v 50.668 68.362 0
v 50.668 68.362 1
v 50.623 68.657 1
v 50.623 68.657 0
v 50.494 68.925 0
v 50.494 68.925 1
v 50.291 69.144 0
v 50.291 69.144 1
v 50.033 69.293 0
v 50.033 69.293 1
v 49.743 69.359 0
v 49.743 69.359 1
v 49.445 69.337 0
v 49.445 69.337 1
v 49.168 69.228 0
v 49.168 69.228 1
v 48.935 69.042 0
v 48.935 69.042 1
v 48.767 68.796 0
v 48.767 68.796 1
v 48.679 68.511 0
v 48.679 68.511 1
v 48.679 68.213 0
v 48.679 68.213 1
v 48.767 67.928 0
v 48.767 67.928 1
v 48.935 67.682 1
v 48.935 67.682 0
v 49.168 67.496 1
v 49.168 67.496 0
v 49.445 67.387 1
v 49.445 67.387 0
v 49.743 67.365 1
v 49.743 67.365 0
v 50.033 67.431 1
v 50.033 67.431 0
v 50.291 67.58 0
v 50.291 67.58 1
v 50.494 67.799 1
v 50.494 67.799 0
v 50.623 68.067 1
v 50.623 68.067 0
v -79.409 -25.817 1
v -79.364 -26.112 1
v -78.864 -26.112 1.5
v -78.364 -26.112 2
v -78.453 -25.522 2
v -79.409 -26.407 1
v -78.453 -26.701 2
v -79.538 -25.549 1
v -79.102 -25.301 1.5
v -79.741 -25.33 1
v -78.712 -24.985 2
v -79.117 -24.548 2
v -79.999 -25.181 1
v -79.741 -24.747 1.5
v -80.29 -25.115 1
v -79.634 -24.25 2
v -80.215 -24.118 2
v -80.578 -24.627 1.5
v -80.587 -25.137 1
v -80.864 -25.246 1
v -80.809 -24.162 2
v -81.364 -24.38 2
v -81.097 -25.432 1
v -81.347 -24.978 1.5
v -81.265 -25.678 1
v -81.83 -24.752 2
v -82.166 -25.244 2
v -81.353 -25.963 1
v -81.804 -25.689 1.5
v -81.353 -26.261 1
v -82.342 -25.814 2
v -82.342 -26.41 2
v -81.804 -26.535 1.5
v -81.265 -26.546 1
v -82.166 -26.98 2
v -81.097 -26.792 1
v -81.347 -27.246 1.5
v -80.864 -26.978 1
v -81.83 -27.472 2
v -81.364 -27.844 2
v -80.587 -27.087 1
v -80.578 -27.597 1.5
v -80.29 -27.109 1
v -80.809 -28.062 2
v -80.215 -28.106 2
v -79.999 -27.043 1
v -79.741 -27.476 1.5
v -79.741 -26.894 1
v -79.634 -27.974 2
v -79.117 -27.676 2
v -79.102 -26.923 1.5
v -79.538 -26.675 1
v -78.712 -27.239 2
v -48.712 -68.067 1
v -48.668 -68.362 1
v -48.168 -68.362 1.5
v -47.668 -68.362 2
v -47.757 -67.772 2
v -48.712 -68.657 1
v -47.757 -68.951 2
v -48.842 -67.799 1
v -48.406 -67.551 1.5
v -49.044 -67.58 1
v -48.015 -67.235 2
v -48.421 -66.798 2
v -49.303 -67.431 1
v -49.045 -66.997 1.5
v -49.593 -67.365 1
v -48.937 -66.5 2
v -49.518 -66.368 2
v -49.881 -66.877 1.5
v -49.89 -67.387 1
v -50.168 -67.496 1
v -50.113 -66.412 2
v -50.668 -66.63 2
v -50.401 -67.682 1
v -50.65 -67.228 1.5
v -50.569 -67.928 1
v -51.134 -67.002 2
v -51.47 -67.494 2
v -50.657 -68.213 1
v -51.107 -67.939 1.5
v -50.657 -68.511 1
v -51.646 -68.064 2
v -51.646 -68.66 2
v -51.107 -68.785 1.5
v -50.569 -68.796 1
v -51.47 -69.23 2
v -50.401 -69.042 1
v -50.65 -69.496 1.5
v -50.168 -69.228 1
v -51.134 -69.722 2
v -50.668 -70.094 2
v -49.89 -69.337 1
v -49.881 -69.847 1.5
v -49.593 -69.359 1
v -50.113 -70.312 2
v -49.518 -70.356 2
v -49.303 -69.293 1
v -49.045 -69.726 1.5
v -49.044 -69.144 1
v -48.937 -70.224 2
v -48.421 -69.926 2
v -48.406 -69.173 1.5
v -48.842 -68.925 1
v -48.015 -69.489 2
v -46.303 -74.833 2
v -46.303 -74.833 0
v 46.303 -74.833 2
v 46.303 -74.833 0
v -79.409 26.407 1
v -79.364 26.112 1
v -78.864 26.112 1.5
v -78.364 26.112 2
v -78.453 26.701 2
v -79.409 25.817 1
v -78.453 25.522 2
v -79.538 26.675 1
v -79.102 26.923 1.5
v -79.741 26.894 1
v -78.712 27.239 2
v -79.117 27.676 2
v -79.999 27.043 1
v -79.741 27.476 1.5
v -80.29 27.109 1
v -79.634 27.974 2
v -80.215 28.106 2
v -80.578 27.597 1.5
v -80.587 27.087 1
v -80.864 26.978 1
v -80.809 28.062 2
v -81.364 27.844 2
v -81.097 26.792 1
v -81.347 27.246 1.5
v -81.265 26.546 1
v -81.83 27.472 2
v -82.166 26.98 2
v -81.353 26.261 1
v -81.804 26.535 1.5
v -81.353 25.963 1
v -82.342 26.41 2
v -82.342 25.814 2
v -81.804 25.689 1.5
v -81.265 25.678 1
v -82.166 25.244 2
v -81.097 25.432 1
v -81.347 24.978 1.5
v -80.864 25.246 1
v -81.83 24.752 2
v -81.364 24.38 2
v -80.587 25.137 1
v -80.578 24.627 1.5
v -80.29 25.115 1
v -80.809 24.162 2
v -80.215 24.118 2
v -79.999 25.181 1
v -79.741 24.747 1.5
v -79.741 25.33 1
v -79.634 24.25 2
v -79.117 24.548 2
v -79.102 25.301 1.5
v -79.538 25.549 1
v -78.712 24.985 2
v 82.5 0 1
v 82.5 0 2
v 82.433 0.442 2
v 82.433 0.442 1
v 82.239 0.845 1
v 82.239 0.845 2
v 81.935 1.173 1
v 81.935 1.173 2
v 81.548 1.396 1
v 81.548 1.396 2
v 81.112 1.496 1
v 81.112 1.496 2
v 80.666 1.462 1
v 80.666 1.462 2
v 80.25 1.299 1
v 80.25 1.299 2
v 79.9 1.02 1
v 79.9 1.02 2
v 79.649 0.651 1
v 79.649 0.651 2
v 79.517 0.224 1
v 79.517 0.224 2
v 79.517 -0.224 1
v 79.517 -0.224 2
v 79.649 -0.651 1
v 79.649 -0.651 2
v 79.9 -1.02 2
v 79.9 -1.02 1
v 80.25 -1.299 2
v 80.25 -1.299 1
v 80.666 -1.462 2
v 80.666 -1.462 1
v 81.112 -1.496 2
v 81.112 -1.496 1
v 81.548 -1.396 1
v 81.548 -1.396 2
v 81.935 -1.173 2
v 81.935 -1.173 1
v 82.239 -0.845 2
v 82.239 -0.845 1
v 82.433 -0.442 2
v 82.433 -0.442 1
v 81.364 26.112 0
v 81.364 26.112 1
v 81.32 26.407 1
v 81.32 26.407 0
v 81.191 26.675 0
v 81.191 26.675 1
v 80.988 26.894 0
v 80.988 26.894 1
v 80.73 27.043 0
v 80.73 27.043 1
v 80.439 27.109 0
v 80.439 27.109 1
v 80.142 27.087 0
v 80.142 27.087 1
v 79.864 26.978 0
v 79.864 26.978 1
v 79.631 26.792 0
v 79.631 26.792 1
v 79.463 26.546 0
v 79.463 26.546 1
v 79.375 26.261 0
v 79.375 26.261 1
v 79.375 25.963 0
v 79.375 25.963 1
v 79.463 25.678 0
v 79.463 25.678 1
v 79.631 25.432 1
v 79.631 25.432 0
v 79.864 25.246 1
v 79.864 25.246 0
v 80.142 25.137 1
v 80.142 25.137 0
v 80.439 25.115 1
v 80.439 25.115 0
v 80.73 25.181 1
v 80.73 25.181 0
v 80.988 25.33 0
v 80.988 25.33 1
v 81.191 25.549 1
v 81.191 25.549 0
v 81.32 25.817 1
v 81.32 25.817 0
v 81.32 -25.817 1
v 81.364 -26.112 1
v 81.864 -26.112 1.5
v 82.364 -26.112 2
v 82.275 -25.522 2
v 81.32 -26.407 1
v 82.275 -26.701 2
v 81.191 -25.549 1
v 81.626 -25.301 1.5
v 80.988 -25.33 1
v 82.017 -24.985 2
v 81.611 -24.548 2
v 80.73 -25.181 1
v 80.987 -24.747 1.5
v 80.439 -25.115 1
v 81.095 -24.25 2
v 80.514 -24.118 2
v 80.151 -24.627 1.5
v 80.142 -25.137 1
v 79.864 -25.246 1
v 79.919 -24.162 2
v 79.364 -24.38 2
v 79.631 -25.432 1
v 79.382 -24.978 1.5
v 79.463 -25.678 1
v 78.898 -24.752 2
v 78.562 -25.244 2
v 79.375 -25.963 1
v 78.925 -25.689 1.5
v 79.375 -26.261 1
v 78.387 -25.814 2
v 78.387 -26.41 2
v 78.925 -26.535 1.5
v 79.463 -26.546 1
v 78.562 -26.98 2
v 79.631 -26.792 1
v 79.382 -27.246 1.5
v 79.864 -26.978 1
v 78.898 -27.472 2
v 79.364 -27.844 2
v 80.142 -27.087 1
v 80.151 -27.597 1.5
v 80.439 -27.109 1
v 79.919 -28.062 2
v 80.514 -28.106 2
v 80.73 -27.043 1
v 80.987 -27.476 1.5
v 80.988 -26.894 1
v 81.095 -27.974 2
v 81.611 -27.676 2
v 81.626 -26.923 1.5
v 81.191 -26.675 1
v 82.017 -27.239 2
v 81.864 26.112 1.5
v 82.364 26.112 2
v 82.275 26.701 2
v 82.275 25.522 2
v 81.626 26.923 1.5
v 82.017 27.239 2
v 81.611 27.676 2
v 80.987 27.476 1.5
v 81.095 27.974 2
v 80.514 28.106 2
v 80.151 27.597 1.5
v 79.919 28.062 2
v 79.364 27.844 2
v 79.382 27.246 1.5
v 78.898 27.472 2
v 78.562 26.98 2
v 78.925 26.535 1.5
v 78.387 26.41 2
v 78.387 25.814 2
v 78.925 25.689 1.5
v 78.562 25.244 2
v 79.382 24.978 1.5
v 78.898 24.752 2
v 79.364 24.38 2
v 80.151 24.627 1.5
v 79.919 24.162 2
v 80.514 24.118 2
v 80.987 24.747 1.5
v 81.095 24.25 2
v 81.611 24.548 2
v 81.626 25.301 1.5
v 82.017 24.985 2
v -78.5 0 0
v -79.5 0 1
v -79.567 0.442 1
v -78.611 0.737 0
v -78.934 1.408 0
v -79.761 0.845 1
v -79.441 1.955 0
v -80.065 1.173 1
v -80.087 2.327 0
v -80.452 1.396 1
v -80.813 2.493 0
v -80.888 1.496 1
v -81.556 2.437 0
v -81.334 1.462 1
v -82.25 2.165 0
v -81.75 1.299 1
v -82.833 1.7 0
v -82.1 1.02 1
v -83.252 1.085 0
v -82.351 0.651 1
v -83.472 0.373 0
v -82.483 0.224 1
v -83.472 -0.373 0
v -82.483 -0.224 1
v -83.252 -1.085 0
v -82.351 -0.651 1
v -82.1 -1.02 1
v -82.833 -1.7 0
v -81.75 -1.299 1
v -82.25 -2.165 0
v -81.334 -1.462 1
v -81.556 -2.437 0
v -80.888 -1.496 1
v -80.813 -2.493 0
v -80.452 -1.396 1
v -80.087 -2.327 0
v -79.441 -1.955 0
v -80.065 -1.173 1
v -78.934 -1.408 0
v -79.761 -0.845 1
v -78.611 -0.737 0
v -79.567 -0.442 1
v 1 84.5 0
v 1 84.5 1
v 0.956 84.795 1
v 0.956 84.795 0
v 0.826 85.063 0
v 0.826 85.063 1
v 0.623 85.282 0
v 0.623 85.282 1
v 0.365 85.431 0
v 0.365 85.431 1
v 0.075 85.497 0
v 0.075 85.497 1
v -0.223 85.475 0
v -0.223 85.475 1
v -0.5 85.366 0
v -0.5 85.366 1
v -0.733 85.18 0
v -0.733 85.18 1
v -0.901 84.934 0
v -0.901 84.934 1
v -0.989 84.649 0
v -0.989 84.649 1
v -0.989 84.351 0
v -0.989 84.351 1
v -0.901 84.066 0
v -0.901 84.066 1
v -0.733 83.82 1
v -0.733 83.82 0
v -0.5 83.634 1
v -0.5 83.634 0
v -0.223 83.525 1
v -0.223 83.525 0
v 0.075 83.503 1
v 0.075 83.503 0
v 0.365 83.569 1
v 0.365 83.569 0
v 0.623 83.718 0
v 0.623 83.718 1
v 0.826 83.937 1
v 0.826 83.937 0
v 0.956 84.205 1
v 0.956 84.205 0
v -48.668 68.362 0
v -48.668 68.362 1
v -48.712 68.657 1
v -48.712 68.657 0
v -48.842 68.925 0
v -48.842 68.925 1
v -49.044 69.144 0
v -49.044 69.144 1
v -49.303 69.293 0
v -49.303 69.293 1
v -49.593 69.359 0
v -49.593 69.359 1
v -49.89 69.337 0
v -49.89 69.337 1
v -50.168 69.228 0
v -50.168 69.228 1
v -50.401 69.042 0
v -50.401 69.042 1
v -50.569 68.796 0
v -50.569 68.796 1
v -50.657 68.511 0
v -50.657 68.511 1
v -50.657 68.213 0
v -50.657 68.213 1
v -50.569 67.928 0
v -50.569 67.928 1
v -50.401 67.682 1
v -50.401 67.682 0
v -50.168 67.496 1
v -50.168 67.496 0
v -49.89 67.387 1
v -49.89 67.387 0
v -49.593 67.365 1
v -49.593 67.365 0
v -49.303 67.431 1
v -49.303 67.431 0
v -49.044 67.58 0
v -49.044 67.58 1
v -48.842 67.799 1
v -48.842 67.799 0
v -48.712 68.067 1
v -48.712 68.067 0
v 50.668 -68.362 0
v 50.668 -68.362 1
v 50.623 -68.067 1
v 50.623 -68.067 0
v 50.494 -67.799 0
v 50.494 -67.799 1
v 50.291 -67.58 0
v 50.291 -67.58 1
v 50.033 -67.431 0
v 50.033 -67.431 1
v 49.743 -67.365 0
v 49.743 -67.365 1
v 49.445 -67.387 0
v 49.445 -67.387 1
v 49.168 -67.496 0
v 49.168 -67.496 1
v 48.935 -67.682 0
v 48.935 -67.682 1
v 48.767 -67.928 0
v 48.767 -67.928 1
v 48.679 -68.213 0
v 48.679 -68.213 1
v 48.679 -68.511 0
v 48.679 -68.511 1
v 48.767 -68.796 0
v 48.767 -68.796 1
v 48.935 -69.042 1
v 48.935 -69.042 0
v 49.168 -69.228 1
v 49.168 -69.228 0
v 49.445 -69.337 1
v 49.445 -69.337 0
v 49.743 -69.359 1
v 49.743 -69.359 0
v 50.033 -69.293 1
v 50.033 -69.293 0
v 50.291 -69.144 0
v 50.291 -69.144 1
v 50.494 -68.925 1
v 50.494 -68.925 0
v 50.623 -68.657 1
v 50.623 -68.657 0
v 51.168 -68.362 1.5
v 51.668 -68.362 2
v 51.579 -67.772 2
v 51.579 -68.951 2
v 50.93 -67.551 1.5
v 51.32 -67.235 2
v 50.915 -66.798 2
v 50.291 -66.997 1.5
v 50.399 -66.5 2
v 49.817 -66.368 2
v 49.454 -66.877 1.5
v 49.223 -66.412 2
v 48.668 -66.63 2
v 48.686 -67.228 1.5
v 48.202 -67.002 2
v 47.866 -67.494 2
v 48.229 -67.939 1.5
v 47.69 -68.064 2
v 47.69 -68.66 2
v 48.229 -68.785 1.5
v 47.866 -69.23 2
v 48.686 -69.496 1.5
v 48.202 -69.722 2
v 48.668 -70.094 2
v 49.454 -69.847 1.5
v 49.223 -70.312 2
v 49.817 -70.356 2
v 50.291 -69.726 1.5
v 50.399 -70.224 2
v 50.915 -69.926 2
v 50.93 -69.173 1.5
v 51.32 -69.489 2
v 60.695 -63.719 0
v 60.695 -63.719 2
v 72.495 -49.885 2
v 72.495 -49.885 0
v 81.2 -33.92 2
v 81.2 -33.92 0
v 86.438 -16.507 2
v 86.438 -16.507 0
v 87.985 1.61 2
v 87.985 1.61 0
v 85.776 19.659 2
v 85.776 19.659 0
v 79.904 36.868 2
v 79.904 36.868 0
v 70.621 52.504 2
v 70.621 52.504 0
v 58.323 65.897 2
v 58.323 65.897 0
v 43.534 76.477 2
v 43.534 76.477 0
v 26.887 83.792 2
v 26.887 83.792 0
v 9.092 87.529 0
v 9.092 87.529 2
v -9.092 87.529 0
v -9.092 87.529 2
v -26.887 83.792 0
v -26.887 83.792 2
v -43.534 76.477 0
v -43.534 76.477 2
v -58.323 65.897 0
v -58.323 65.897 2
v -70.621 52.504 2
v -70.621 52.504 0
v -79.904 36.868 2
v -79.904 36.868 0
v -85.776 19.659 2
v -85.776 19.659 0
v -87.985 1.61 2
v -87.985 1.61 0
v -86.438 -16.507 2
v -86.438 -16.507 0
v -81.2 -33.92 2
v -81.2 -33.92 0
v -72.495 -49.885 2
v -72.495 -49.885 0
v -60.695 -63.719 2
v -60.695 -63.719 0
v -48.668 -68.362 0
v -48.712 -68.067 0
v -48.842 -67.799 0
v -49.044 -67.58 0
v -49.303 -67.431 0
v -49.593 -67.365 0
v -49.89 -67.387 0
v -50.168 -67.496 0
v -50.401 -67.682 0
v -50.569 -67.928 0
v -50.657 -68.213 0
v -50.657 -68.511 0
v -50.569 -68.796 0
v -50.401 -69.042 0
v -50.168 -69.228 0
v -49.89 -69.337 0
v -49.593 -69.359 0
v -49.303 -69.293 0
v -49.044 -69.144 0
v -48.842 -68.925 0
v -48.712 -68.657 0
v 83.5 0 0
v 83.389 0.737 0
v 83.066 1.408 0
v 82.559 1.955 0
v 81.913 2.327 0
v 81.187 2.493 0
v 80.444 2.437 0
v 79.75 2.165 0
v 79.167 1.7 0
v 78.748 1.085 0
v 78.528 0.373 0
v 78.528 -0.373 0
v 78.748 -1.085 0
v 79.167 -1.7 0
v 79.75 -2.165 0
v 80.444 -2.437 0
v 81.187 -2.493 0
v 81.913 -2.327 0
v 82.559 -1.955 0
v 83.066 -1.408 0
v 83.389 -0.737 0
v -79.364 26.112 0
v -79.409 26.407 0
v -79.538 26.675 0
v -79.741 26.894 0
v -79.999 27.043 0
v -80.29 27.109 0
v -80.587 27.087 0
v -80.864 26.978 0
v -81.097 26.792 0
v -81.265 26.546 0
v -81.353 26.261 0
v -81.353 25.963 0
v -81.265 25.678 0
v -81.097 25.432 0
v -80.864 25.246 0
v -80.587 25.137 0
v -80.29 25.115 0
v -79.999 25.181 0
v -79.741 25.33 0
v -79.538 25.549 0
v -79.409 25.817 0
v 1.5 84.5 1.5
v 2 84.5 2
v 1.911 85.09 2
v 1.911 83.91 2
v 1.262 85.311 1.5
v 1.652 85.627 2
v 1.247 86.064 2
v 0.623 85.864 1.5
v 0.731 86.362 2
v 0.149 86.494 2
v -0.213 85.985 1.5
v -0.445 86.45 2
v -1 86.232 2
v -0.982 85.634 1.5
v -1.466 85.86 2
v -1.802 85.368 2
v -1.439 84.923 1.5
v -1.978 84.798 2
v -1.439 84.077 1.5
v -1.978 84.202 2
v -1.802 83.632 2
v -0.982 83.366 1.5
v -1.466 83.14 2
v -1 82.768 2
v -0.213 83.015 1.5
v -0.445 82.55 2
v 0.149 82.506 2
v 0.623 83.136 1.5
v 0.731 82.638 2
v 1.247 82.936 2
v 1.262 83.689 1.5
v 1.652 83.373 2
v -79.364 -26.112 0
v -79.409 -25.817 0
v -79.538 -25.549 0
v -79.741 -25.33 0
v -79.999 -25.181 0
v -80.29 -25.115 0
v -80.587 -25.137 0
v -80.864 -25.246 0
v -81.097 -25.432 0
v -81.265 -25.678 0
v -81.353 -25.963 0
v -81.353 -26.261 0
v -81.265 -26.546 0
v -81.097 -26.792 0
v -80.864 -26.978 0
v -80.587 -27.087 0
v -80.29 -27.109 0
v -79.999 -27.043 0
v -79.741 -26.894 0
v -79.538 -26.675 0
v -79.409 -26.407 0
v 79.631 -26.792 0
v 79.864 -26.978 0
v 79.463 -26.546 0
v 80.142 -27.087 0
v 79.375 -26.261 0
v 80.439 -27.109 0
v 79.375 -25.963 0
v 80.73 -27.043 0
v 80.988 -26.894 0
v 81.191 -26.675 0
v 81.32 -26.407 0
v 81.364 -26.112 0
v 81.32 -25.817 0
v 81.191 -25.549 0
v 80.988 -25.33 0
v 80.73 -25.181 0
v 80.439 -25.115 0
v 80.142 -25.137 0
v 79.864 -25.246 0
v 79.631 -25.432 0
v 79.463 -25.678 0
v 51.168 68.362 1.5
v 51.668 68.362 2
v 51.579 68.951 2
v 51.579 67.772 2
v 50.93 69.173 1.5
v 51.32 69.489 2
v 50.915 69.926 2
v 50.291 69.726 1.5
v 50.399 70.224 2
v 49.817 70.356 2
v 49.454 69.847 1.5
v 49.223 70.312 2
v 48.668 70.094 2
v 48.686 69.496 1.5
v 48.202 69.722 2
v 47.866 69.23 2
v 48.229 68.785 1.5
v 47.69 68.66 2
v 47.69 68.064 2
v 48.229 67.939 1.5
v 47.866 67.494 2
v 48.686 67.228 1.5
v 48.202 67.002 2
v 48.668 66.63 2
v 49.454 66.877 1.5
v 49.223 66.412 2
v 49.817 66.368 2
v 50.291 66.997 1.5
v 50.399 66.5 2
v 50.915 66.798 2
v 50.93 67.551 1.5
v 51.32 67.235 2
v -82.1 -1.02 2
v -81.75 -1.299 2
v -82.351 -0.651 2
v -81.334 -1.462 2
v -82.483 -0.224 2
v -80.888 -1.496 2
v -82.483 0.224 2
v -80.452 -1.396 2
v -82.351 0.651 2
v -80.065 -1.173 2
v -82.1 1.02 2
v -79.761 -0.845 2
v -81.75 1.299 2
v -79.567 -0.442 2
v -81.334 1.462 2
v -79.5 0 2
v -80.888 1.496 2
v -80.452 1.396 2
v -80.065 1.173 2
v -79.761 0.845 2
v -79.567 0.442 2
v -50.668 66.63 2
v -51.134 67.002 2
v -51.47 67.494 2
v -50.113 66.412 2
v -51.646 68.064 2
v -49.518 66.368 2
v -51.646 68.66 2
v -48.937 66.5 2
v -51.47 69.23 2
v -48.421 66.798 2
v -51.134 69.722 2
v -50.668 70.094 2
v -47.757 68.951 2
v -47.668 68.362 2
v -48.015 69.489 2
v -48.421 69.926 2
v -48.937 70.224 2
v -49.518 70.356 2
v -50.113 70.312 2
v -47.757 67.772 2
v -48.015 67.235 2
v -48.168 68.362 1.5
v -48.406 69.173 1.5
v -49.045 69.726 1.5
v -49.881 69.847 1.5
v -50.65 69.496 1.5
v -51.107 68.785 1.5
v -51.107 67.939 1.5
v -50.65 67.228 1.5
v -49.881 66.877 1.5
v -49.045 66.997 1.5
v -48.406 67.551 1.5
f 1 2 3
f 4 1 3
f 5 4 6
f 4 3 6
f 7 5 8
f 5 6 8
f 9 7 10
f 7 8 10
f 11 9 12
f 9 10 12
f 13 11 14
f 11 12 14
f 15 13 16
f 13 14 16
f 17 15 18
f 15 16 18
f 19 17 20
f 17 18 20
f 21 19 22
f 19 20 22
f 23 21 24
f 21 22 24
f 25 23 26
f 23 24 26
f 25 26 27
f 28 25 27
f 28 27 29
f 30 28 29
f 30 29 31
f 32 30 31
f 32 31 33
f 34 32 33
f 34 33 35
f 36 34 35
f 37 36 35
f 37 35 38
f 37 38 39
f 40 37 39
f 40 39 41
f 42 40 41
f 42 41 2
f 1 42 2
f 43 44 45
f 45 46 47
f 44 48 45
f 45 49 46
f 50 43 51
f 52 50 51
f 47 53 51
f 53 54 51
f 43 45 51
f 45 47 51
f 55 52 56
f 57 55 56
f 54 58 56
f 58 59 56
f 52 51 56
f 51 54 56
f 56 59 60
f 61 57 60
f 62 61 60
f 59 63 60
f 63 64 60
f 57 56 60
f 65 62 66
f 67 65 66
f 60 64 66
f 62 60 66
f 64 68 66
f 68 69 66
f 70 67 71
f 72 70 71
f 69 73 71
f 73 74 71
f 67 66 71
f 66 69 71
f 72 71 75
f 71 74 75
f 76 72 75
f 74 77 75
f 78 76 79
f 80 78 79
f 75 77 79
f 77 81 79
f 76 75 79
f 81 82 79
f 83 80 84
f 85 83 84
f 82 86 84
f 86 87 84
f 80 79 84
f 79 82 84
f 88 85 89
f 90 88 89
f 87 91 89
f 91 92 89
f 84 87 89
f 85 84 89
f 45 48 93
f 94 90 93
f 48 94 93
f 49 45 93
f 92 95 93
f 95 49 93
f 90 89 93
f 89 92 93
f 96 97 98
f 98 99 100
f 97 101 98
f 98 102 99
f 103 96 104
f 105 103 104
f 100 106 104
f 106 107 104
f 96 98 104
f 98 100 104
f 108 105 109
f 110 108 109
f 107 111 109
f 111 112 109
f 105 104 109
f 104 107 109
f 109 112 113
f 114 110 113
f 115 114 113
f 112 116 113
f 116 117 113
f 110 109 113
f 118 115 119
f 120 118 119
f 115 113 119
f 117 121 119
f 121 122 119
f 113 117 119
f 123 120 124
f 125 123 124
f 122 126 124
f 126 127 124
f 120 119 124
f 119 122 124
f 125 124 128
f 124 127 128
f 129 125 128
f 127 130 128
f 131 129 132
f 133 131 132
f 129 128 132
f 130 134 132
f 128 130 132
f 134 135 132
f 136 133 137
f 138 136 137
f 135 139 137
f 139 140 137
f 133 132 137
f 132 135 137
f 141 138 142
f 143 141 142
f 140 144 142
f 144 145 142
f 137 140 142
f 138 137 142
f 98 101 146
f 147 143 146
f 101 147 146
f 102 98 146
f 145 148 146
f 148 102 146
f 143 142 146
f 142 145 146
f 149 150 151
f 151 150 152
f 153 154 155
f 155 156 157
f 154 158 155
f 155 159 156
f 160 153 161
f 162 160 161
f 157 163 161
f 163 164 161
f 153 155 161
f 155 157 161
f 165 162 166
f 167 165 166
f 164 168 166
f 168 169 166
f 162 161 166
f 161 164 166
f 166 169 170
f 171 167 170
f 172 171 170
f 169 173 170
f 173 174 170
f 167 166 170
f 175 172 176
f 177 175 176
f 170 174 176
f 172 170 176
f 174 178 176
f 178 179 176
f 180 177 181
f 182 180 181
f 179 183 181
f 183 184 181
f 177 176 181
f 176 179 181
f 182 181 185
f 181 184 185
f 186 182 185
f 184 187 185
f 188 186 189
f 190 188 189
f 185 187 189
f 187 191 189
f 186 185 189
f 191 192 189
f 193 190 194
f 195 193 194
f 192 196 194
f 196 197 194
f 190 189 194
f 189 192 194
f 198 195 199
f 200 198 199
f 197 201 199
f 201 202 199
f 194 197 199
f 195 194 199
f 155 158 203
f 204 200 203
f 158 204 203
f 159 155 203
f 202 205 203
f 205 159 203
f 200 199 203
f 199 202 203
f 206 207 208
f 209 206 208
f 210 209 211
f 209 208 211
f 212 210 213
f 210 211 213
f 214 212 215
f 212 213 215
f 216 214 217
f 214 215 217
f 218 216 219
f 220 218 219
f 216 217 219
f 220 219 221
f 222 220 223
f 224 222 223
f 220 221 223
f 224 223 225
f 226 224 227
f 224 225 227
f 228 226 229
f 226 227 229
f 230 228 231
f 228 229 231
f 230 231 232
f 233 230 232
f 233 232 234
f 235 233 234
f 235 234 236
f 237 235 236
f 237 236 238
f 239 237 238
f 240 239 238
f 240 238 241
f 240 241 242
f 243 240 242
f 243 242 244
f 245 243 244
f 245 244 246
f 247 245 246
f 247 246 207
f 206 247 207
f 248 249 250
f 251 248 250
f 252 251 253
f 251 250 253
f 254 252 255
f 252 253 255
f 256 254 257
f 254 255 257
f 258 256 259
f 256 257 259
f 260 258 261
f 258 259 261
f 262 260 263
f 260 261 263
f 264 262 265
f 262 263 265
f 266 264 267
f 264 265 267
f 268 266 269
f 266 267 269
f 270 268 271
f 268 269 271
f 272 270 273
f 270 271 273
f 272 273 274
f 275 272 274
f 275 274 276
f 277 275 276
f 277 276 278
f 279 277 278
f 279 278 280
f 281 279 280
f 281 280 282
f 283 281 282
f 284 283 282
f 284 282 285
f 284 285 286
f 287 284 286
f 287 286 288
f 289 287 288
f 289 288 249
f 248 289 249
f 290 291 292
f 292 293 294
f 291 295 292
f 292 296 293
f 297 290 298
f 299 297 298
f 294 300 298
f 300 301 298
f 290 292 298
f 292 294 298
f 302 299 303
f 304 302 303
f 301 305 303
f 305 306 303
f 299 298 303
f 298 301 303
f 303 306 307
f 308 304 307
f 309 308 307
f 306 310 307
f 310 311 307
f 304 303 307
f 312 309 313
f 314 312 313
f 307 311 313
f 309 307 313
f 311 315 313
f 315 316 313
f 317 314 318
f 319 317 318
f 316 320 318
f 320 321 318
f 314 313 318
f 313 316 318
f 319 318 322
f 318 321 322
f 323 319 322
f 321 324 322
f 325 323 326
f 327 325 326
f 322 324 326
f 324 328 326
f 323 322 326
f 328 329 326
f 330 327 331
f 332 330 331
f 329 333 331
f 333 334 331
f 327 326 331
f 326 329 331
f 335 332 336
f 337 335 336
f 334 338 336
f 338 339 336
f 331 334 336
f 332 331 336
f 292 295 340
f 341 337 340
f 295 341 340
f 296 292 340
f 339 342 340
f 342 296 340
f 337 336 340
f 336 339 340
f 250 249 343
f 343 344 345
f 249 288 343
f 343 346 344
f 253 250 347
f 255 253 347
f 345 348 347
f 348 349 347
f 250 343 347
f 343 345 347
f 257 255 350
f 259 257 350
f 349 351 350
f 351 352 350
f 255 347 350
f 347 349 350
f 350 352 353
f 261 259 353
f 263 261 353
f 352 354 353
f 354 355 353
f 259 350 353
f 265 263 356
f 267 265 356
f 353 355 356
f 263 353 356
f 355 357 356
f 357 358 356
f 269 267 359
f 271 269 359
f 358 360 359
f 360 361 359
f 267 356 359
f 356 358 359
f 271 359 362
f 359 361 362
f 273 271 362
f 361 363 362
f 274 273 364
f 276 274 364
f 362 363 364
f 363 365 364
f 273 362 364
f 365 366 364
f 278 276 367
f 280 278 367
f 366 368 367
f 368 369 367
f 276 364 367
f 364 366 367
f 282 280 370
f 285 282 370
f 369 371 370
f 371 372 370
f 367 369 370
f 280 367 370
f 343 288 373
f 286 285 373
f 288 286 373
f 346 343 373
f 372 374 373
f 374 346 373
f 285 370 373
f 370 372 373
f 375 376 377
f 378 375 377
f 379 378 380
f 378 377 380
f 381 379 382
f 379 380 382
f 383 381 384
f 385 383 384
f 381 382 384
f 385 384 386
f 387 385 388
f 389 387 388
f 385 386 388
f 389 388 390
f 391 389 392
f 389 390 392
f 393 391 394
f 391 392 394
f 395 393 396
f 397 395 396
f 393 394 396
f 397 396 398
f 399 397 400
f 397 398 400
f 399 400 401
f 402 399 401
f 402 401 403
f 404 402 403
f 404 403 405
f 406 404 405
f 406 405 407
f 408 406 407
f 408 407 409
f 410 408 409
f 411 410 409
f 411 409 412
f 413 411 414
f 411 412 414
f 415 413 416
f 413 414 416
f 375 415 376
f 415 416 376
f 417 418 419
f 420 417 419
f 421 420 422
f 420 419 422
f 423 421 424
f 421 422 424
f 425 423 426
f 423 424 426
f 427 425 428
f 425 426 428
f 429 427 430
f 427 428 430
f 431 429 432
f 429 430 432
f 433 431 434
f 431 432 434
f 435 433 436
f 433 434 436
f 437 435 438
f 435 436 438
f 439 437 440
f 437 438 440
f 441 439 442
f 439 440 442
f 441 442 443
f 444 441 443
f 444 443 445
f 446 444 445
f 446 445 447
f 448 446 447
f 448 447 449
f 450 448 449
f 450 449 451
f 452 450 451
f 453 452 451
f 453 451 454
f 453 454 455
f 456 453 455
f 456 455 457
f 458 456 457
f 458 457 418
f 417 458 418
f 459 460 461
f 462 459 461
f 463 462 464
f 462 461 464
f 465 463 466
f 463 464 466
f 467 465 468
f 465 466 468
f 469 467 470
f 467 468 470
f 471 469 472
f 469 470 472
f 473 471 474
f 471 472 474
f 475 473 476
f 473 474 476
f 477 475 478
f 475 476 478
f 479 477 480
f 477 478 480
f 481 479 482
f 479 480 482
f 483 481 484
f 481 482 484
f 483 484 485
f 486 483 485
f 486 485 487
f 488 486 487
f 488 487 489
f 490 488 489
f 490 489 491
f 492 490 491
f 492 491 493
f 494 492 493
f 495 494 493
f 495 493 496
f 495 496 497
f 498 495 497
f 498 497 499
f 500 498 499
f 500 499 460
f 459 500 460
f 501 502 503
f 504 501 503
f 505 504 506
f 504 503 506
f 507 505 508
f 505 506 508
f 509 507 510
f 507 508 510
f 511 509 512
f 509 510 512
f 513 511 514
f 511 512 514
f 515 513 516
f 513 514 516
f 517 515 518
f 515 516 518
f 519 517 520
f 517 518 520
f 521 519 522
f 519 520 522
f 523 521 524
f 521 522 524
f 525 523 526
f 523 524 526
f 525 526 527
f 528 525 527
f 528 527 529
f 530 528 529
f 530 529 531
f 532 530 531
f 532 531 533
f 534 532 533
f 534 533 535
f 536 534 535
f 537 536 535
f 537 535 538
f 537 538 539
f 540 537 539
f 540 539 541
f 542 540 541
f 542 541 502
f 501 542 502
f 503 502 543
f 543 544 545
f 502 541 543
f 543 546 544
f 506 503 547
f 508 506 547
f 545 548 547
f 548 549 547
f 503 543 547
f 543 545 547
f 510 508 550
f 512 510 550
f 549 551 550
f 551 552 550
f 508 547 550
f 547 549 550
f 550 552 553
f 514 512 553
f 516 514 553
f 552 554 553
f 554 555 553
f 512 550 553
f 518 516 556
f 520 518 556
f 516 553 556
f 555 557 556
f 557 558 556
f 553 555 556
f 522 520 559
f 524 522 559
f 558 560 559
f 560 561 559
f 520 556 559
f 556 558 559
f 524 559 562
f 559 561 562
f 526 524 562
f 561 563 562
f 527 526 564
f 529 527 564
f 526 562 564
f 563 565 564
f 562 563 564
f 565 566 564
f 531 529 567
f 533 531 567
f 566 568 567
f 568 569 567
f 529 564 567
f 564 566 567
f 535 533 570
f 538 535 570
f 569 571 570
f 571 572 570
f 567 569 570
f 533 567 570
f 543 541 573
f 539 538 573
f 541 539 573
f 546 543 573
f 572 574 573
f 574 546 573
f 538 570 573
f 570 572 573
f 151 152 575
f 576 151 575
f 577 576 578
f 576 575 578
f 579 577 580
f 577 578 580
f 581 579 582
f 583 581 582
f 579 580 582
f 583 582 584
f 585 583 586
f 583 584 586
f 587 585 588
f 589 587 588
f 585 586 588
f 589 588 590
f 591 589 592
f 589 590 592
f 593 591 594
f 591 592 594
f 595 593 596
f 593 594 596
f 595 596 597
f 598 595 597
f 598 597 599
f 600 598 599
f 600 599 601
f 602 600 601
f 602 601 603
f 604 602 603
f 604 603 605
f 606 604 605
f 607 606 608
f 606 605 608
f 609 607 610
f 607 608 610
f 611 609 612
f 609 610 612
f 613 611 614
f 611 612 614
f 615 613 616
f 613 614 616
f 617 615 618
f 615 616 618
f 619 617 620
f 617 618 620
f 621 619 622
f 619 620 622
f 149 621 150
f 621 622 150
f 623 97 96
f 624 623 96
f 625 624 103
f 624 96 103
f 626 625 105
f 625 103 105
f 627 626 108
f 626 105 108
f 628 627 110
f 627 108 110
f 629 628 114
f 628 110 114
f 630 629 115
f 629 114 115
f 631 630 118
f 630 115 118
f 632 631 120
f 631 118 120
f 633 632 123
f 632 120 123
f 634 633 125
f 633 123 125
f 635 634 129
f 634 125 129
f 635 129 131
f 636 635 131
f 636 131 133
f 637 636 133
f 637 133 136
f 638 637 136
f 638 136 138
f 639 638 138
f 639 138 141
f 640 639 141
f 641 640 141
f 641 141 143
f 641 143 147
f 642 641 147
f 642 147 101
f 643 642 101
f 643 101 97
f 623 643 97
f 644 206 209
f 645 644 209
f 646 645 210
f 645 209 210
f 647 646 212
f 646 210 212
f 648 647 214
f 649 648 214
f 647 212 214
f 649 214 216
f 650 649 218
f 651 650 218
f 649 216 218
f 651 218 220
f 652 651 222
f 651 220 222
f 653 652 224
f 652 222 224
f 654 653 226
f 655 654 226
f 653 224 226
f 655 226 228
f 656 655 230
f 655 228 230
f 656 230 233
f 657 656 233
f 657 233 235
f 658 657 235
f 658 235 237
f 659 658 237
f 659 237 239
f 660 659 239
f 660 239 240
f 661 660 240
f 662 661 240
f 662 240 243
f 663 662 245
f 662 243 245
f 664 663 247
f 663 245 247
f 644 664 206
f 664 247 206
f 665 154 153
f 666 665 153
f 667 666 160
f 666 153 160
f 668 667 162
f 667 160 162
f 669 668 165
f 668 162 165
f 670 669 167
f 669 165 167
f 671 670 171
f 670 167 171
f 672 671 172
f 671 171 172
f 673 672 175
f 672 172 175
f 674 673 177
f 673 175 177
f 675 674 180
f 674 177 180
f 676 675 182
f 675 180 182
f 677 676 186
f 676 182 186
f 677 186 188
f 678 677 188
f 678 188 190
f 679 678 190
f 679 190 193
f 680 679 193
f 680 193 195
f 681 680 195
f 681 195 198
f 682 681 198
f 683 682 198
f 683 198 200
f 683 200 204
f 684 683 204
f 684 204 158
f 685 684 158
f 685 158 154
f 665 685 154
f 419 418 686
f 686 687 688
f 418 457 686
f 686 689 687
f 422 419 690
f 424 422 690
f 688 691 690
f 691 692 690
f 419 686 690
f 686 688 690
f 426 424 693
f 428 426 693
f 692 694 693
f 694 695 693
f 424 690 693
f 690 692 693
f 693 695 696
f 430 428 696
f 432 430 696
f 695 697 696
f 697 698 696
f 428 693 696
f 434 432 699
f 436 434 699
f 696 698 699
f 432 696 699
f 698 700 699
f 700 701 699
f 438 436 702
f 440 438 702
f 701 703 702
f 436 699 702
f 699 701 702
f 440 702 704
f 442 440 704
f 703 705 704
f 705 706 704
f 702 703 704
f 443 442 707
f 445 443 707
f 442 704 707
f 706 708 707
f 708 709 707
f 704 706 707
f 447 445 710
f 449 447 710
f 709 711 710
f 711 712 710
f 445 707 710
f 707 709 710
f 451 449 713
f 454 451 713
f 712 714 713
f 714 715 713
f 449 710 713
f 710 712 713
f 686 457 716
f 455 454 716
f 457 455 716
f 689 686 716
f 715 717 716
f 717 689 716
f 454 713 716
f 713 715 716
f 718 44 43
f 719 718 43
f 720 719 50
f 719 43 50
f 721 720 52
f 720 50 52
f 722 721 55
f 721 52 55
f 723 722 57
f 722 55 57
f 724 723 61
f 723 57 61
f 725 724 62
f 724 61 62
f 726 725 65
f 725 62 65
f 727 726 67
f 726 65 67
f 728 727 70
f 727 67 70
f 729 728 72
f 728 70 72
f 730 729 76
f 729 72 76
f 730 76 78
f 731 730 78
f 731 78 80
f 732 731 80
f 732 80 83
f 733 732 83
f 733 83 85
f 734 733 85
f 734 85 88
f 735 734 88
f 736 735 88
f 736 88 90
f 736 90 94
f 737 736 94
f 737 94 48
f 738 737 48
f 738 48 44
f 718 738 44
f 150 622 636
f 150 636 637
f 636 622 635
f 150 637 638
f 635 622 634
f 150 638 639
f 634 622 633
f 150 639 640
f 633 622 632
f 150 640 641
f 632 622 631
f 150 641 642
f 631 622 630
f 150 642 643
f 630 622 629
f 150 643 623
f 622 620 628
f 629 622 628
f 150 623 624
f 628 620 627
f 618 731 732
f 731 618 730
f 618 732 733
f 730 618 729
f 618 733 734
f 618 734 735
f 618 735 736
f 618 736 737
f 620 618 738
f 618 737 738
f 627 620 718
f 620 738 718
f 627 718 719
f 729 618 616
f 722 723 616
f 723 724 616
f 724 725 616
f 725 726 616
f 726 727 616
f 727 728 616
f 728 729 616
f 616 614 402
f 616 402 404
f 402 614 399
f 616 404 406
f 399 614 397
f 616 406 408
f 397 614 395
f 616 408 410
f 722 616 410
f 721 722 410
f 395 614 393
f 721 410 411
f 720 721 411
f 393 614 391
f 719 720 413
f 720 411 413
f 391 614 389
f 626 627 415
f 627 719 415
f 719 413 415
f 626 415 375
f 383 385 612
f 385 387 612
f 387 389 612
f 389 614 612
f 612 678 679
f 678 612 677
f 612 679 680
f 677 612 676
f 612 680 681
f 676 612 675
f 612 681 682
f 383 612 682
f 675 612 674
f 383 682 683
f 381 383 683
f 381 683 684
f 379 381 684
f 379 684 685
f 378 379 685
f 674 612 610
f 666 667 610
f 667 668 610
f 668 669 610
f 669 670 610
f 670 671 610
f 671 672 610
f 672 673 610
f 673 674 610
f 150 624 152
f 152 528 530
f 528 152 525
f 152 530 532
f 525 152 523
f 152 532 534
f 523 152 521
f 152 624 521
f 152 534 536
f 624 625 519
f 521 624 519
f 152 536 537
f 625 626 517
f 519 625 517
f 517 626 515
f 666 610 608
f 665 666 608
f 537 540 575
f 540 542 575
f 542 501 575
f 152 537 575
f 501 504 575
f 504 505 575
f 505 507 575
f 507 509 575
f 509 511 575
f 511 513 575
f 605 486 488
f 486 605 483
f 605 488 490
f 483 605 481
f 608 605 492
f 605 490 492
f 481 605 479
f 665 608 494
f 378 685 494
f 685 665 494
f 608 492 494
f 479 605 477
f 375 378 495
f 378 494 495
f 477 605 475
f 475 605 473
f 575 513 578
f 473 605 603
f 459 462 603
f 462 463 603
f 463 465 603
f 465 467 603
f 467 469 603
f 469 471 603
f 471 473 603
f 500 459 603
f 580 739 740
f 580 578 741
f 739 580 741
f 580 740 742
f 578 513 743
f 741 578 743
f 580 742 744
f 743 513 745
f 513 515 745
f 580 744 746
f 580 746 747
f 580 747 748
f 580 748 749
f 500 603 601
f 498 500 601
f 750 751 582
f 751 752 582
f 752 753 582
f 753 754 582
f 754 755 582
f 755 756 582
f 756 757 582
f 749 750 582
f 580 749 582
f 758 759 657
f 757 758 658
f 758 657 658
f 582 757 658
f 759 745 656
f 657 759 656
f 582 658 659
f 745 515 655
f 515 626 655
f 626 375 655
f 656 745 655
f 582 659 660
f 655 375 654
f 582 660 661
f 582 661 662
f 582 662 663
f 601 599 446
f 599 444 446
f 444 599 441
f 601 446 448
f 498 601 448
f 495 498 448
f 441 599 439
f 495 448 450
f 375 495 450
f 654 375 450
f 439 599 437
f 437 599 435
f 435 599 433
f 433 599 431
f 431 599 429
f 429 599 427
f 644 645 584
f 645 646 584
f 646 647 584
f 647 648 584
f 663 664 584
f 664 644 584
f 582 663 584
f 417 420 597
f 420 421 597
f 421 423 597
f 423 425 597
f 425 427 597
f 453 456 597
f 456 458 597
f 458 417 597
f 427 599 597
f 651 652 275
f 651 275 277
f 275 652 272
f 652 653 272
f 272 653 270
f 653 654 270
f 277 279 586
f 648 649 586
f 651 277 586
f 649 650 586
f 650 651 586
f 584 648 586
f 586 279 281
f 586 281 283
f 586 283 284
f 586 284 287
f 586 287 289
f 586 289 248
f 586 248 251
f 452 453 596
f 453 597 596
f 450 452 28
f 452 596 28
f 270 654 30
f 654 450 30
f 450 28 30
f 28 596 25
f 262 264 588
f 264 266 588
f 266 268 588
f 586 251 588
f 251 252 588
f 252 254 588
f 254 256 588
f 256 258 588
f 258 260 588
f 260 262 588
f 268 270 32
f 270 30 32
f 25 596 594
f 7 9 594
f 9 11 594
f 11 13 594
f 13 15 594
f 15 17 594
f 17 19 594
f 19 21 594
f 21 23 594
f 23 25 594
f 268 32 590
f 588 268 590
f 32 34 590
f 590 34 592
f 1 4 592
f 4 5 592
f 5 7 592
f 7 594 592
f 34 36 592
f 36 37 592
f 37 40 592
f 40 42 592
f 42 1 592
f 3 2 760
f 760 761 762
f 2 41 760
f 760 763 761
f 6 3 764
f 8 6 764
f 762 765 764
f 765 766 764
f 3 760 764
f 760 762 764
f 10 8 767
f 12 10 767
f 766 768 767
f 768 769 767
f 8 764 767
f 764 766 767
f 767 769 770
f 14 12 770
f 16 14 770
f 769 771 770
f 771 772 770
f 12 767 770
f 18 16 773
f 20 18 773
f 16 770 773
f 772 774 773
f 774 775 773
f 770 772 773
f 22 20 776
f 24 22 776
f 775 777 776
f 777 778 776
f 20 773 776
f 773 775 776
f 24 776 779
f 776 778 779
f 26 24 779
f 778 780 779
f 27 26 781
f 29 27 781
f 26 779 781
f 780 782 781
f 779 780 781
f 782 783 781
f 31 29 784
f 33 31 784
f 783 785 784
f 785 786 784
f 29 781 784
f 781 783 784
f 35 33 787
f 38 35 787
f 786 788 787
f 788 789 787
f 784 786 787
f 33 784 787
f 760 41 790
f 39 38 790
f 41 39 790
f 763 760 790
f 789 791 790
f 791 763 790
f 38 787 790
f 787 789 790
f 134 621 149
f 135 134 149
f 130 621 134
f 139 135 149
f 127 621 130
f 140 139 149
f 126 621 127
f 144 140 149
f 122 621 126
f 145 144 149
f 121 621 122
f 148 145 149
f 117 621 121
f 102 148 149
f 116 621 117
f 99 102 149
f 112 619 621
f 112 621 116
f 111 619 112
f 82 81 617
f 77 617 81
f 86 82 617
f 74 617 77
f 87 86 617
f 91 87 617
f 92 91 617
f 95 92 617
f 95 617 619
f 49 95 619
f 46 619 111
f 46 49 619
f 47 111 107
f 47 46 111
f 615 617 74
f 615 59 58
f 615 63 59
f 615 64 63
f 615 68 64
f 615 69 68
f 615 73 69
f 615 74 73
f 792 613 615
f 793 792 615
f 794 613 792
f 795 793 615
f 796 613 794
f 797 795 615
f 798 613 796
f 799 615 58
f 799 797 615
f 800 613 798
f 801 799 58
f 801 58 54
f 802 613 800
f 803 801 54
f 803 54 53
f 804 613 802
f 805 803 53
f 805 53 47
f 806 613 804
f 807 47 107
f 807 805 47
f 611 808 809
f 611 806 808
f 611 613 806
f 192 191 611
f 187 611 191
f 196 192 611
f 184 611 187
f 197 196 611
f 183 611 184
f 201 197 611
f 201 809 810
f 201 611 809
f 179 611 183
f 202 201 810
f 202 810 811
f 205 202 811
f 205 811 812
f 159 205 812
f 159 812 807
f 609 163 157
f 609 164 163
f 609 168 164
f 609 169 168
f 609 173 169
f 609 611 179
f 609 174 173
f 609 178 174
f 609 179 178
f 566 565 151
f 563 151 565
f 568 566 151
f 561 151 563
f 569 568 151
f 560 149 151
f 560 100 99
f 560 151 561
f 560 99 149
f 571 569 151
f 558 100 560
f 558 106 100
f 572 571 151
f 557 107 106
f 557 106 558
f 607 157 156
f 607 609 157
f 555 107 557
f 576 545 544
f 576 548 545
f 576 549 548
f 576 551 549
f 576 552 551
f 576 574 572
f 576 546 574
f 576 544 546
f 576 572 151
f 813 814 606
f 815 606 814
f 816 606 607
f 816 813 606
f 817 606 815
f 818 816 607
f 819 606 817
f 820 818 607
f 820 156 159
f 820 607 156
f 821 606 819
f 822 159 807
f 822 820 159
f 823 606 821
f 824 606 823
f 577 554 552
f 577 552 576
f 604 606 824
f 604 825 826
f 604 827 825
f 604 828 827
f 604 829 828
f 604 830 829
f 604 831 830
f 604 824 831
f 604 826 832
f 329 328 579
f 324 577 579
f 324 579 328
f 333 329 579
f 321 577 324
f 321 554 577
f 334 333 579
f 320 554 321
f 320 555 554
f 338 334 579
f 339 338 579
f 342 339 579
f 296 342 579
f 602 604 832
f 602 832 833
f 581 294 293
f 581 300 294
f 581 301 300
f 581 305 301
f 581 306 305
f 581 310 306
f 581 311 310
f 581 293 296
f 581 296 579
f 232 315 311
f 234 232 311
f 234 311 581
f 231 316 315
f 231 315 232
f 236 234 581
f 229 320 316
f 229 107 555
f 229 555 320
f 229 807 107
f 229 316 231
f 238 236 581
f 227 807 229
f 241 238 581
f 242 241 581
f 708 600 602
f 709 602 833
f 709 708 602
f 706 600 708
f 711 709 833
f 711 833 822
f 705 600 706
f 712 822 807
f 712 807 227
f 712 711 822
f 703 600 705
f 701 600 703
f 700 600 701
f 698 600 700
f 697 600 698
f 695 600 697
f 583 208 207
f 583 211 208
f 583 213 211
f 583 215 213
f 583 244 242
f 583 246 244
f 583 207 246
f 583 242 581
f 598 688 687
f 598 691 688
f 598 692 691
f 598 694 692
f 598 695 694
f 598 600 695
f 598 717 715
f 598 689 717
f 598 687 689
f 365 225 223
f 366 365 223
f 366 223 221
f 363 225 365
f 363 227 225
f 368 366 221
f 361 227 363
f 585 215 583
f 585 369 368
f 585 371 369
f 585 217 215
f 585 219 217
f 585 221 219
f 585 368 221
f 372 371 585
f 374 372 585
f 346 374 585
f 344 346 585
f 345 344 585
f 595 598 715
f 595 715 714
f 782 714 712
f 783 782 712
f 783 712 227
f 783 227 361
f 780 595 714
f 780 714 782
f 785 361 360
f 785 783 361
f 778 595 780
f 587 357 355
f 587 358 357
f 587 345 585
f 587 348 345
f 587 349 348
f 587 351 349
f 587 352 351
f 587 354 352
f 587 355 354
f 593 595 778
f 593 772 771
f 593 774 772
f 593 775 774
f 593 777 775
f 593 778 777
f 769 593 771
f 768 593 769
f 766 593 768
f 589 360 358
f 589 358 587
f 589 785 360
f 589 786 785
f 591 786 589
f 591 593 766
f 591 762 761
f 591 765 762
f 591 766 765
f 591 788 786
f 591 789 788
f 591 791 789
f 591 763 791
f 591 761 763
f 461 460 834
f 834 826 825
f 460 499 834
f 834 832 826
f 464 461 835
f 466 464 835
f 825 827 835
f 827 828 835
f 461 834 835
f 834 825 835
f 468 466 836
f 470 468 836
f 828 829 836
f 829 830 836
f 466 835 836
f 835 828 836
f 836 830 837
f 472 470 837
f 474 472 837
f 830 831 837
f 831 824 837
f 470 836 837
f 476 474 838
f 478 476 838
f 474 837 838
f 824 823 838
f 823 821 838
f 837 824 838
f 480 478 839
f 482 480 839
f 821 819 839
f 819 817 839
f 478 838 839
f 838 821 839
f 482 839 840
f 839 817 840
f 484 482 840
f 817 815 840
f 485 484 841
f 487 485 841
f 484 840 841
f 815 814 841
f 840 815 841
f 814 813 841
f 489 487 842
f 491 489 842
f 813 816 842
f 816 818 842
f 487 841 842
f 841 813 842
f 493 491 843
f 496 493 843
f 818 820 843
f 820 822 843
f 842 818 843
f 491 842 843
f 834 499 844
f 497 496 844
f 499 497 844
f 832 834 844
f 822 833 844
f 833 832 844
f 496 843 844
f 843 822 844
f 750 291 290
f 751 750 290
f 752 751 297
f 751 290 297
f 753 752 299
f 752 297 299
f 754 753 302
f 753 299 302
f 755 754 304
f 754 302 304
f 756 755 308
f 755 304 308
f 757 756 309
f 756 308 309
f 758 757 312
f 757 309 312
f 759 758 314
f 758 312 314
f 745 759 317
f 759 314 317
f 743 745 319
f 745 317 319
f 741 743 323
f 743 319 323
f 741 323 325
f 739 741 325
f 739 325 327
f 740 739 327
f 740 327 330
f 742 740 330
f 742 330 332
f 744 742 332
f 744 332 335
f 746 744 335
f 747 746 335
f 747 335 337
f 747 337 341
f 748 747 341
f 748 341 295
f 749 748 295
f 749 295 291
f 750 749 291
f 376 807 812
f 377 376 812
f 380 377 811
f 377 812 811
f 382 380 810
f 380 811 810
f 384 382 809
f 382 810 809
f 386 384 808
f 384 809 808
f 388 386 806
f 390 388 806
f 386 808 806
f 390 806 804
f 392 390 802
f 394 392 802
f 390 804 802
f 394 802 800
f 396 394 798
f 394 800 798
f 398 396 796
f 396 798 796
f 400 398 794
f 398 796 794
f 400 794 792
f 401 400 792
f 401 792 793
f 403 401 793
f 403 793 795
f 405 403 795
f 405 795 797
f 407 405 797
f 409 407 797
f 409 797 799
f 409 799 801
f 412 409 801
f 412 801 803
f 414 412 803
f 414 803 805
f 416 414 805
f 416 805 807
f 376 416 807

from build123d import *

# Parameters (mm, degrees)
RESSALTO_EXTRUS_O1_DEPTH = 2
CORTE_EXTRUS_O2_REACH    = 4
ESBO_O3_R                = 1.5
CHANFRO2_SIZE            = 1
CORTE_EXTRUS_O3_REACH    = 4
ESBO_O4_R                = 1
CHANFRO3_SIZE            = 1


with BuildPart() as part:
    # Esboço1 → Ressalto-extrusão1 (new body)
    with BuildSketch(Plane.XY):
        with BuildLine():
            Line((-46.303347611, -74.833147735), (46.303347611, -74.833147735))
            ThreePointArc((46.303347611, -74.833147735), (0, 88), (-46.303347611, -74.833147735))
        make_face()
    extrude(amount=RESSALTO_EXTRUS_O1_DEPTH)

    # Esboço3 → Corte-extrusão2 (cut, up to next)
    with BuildSketch(Plane.XY.offset(2), mode=Mode.PRIVATE) as corte_extrus_o2_sk1:
        with Locations((81, 0)):
            Circle(ESBO_O3_R)
    corte_extrus_o2_tool1 = extrude(corte_extrus_o2_sk1.sketch, amount=-CORTE_EXTRUS_O2_REACH, mode=Mode.PRIVATE) & part.part
    add(corte_extrus_o2_tool1.solids().sort_by_distance((81, 0, 2))[0], mode=Mode.SUBTRACT)
    # Esboço3 → Corte-extrusão2 (cut, up to next)
    with BuildSketch(Plane.XY.offset(2), mode=Mode.PRIVATE) as corte_extrus_o2_sk2:
        with Locations((-81, 0)):
            Circle(ESBO_O3_R)
    corte_extrus_o2_tool2 = extrude(corte_extrus_o2_sk2.sketch, amount=-CORTE_EXTRUS_O2_REACH, mode=Mode.PRIVATE) & part.part
    add(corte_extrus_o2_tool2.solids().sort_by_distance((-81, 0, 2))[0], mode=Mode.SUBTRACT)

    # Chanfro2
    chanfro2_edges = [part.edges().sort_by_distance(p)[0] for p in [
        (79.5, 0, 0),
        (-82.5, 0, 0),
    ]]
    chamfer(chanfro2_edges, length=CHANFRO2_SIZE)

    # Esboço4 → Corte-extrusão3 (cut, up to next)
    with BuildSketch(Plane.XY.offset(2), mode=Mode.PRIVATE) as corte_extrus_o3_sk1:
        with Locations((-49.667853819, -68.361936025)):
            Circle(ESBO_O4_R)
    corte_extrus_o3_tool1 = extrude(corte_extrus_o3_sk1.sketch, amount=-CORTE_EXTRUS_O3_REACH, mode=Mode.PRIVATE) & part.part
    add(corte_extrus_o3_tool1.solids().sort_by_distance((-49.667854, -68.361936, 2))[0], mode=Mode.SUBTRACT)
    # Esboço4 → Corte-extrusão3 (cut, up to next)
    with BuildSketch(Plane.XY.offset(2), mode=Mode.PRIVATE) as corte_extrus_o3_sk2:
        with Locations((-80.364275627, -26.111936025)):
            Circle(ESBO_O4_R)
    corte_extrus_o3_tool2 = extrude(corte_extrus_o3_sk2.sketch, amount=-CORTE_EXTRUS_O3_REACH, mode=Mode.PRIVATE) & part.part
    add(corte_extrus_o3_tool2.solids().sort_by_distance((-80.364276, -26.111936, 2))[0], mode=Mode.SUBTRACT)
    # Esboço4 → Corte-extrusão3 (cut, up to next)
    with BuildSketch(Plane.XY.offset(2), mode=Mode.PRIVATE) as corte_extrus_o3_sk3:
        with Locations((-80.364275627, 26.111936025)):
            Circle(ESBO_O4_R)
    corte_extrus_o3_tool3 = extrude(corte_extrus_o3_sk3.sketch, amount=-CORTE_EXTRUS_O3_REACH, mode=Mode.PRIVATE) & part.part
    add(corte_extrus_o3_tool3.solids().sort_by_distance((-80.364276, 26.111936, 2))[0], mode=Mode.SUBTRACT)
    # Esboço4 → Corte-extrusão3 (cut, up to next)
    with BuildSketch(Plane.XY.offset(2), mode=Mode.PRIVATE) as corte_extrus_o3_sk4:
        with Locations((-49.667853819, 68.361936025)):
            Circle(ESBO_O4_R)
    corte_extrus_o3_tool4 = extrude(corte_extrus_o3_sk4.sketch, amount=-CORTE_EXTRUS_O3_REACH, mode=Mode.PRIVATE) & part.part
    add(corte_extrus_o3_tool4.solids().sort_by_distance((-49.667854, 68.361936, 2))[0], mode=Mode.SUBTRACT)
    # Esboço4 → Corte-extrusão3 (cut, up to next)
    with BuildSketch(Plane.XY.offset(2), mode=Mode.PRIVATE) as corte_extrus_o3_sk5:
        with Locations((0, 84.5)):
            Circle(ESBO_O4_R)
    corte_extrus_o3_tool5 = extrude(corte_extrus_o3_sk5.sketch, amount=-CORTE_EXTRUS_O3_REACH, mode=Mode.PRIVATE) & part.part
    add(corte_extrus_o3_tool5.solids().sort_by_distance((0, 84.5, 2))[0], mode=Mode.SUBTRACT)
    # Esboço4 → Corte-extrusão3 (cut, up to next)
    with BuildSketch(Plane.XY.offset(2), mode=Mode.PRIVATE) as corte_extrus_o3_sk6:
        with Locations((49.667853819, 68.361936025)):
            Circle(ESBO_O4_R)
    corte_extrus_o3_tool6 = extrude(corte_extrus_o3_sk6.sketch, amount=-CORTE_EXTRUS_O3_REACH, mode=Mode.PRIVATE) & part.part
    add(corte_extrus_o3_tool6.solids().sort_by_distance((49.667854, 68.361936, 2))[0], mode=Mode.SUBTRACT)
    # Esboço4 → Corte-extrusão3 (cut, up to next)
    with BuildSketch(Plane.XY.offset(2), mode=Mode.PRIVATE) as corte_extrus_o3_sk7:
        with Locations((80.364275627, 26.111936025)):
            Circle(ESBO_O4_R)
    corte_extrus_o3_tool7 = extrude(corte_extrus_o3_sk7.sketch, amount=-CORTE_EXTRUS_O3_REACH, mode=Mode.PRIVATE) & part.part
    add(corte_extrus_o3_tool7.solids().sort_by_distance((80.364276, 26.111936, 2))[0], mode=Mode.SUBTRACT)
    # Esboço4 → Corte-extrusão3 (cut, up to next)
    with BuildSketch(Plane.XY.offset(2), mode=Mode.PRIVATE) as corte_extrus_o3_sk8:
        with Locations((80.364275627, -26.111936025)):
            Circle(ESBO_O4_R)
    corte_extrus_o3_tool8 = extrude(corte_extrus_o3_sk8.sketch, amount=-CORTE_EXTRUS_O3_REACH, mode=Mode.PRIVATE) & part.part
    add(corte_extrus_o3_tool8.solids().sort_by_distance((80.364276, -26.111936, 2))[0], mode=Mode.SUBTRACT)
    # Esboço4 → Corte-extrusão3 (cut, up to next)
    with BuildSketch(Plane.XY.offset(2), mode=Mode.PRIVATE) as corte_extrus_o3_sk9:
        with Locations((49.667853819, -68.361936025)):
            Circle(ESBO_O4_R)
    corte_extrus_o3_tool9 = extrude(corte_extrus_o3_sk9.sketch, amount=-CORTE_EXTRUS_O3_REACH, mode=Mode.PRIVATE) & part.part
    add(corte_extrus_o3_tool9.solids().sort_by_distance((49.667854, -68.361936, 2))[0], mode=Mode.SUBTRACT)

    # Chanfro3
    chanfro3_edges = [part.edges().sort_by_distance(p)[0] for p in [
        (-50.667853819, -68.361936025, 2),
        (-81.364275627, -26.111936025, 2),
        (-81.364275627, 26.111936025, 2),
        (-50.667853819, 68.361936025, 2),
        (-1, 84.5, 2),
        (48.667853819, 68.361936025, 2),
        (79.364275627, 26.111936025, 2),
        (79.364275627, -26.111936025, 2),
        (48.667853819, -68.361936025, 2),
    ]]
    chamfer(chanfro3_edges, length=CHANFRO3_SIZE)


solid = part.part
